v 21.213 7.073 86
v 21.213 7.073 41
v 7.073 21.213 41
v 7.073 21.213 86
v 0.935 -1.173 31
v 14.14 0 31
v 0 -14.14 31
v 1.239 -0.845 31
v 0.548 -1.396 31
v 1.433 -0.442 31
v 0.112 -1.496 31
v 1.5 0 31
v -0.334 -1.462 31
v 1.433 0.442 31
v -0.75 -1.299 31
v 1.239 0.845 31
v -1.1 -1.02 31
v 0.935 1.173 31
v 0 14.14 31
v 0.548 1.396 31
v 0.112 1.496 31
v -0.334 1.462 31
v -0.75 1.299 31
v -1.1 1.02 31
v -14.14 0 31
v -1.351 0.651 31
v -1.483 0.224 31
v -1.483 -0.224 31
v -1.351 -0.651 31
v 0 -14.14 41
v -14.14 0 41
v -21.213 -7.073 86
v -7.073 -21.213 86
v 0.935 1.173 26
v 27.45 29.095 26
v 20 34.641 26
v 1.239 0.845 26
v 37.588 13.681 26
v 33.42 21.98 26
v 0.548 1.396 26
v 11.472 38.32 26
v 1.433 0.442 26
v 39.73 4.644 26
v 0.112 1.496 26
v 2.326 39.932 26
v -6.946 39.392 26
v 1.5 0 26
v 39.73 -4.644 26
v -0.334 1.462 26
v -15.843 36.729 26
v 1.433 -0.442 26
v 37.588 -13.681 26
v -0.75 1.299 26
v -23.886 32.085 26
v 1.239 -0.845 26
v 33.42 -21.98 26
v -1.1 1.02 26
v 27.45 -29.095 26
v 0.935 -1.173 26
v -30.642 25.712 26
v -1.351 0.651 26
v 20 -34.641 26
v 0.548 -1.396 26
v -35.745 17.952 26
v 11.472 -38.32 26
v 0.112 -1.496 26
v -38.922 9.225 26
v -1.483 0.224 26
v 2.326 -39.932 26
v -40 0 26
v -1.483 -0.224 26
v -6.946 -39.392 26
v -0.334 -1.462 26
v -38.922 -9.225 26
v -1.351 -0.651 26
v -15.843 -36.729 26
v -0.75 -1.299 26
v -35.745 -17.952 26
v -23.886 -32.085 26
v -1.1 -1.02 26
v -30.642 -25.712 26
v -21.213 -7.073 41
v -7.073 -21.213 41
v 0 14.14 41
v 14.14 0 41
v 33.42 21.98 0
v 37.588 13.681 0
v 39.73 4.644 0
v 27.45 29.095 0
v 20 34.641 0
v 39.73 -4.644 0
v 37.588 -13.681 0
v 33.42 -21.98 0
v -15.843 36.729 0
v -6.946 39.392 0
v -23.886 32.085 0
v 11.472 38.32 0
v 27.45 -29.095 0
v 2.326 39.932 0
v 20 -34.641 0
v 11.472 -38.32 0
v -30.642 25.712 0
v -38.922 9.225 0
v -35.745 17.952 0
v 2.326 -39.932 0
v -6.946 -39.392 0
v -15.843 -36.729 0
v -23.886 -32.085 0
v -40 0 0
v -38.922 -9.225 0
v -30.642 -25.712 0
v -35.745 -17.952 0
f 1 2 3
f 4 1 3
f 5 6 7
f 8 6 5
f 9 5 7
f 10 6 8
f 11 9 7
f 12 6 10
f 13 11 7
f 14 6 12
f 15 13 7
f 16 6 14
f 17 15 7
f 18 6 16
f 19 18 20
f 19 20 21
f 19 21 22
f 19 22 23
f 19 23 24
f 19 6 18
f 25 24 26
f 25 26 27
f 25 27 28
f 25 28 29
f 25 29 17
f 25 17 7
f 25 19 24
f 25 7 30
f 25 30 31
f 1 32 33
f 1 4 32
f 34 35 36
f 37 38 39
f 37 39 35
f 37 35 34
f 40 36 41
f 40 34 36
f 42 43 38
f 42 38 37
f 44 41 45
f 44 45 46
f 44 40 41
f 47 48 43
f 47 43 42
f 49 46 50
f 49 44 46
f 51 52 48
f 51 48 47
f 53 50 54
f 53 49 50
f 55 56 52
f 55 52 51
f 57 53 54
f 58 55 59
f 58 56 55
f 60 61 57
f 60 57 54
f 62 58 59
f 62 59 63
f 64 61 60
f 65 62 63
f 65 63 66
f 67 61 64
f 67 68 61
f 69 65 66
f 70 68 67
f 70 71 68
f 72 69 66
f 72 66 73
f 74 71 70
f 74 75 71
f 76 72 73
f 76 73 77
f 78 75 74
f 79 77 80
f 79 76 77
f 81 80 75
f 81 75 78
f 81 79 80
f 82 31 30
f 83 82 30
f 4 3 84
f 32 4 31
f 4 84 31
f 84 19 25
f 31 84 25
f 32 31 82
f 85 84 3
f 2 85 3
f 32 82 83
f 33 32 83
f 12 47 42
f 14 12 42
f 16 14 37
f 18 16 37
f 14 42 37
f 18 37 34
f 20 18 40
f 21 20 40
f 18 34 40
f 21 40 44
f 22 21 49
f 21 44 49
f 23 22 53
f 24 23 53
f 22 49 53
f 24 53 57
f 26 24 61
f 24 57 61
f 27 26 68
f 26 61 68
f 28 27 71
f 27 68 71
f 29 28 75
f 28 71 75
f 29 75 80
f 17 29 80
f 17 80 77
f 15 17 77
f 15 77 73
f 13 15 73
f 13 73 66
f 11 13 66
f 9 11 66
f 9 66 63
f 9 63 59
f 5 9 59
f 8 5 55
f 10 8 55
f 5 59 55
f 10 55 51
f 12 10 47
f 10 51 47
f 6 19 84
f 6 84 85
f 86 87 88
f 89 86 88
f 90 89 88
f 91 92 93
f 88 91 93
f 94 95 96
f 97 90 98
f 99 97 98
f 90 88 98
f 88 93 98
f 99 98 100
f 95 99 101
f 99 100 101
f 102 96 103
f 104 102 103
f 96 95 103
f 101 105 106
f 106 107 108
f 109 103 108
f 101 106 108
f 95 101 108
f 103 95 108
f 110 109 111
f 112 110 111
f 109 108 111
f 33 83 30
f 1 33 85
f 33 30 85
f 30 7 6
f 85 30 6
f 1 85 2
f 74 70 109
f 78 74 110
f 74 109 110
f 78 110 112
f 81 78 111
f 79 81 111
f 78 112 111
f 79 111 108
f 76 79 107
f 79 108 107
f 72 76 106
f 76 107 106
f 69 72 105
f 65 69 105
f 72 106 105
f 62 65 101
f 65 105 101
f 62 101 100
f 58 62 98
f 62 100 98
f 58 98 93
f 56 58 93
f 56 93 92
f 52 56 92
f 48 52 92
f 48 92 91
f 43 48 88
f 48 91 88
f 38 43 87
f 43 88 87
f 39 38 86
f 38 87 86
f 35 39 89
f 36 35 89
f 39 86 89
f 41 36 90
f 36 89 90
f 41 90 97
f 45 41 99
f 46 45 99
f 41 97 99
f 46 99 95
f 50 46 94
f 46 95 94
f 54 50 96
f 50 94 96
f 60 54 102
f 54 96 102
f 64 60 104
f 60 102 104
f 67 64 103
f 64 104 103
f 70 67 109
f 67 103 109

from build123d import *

# Parameters (mm, degrees)
SKETCH_1_R      = 40
EXTRUDE_1_DEPTH = 26
SKETCH_2_R      = 1.5
EXTRUDE_2_DEPTH = 5
EXTRUDE_3_DEPTH = 10
EXTRUDE_4_DEPTH = 45


with BuildPart() as part:
    # 草图1 → 凸台-拉伸1 (new body)
    with BuildSketch(Plane.XY):
        with Locations(Location((0, 0, 0), (0, 0, 180))):
            Circle(SKETCH_1_R)
    extrude(amount=EXTRUDE_1_DEPTH)

    # 草图2 → 凸台-拉伸2 (add)
    with BuildSketch(Plane.XY.offset(26)):
        Circle(SKETCH_2_R)
    extrude(amount=EXTRUDE_2_DEPTH)

    # 草图3 → 凸台-拉伸3 (add)
    with BuildSketch(Plane.XY.offset(31)):
        Polygon((0, 14.14), (14.14, 0), (0, -14.14), (-14.14, 0), align=None)
    extrude(amount=EXTRUDE_3_DEPTH)

    # 草图5 → 凸台-拉伸4 (add)
    with BuildSketch(Plane.XY.offset(41)):
        Polygon((0, -14.14), (-14.14, 0), (-21.213203436, -7.073203436), (-7.073203436, -21.213203436), align=None)
        Polygon((7.073203436, 21.213203436), (0, 14.14), (14.14, 0), (21.213203436, 7.073203436), align=None)
        Polygon((14.14, 0), (0, 14.14), (-14.14, 0), (0, -14.14), align=None)
    extrude(amount=EXTRUDE_4_DEPTH)


solid = part.part
